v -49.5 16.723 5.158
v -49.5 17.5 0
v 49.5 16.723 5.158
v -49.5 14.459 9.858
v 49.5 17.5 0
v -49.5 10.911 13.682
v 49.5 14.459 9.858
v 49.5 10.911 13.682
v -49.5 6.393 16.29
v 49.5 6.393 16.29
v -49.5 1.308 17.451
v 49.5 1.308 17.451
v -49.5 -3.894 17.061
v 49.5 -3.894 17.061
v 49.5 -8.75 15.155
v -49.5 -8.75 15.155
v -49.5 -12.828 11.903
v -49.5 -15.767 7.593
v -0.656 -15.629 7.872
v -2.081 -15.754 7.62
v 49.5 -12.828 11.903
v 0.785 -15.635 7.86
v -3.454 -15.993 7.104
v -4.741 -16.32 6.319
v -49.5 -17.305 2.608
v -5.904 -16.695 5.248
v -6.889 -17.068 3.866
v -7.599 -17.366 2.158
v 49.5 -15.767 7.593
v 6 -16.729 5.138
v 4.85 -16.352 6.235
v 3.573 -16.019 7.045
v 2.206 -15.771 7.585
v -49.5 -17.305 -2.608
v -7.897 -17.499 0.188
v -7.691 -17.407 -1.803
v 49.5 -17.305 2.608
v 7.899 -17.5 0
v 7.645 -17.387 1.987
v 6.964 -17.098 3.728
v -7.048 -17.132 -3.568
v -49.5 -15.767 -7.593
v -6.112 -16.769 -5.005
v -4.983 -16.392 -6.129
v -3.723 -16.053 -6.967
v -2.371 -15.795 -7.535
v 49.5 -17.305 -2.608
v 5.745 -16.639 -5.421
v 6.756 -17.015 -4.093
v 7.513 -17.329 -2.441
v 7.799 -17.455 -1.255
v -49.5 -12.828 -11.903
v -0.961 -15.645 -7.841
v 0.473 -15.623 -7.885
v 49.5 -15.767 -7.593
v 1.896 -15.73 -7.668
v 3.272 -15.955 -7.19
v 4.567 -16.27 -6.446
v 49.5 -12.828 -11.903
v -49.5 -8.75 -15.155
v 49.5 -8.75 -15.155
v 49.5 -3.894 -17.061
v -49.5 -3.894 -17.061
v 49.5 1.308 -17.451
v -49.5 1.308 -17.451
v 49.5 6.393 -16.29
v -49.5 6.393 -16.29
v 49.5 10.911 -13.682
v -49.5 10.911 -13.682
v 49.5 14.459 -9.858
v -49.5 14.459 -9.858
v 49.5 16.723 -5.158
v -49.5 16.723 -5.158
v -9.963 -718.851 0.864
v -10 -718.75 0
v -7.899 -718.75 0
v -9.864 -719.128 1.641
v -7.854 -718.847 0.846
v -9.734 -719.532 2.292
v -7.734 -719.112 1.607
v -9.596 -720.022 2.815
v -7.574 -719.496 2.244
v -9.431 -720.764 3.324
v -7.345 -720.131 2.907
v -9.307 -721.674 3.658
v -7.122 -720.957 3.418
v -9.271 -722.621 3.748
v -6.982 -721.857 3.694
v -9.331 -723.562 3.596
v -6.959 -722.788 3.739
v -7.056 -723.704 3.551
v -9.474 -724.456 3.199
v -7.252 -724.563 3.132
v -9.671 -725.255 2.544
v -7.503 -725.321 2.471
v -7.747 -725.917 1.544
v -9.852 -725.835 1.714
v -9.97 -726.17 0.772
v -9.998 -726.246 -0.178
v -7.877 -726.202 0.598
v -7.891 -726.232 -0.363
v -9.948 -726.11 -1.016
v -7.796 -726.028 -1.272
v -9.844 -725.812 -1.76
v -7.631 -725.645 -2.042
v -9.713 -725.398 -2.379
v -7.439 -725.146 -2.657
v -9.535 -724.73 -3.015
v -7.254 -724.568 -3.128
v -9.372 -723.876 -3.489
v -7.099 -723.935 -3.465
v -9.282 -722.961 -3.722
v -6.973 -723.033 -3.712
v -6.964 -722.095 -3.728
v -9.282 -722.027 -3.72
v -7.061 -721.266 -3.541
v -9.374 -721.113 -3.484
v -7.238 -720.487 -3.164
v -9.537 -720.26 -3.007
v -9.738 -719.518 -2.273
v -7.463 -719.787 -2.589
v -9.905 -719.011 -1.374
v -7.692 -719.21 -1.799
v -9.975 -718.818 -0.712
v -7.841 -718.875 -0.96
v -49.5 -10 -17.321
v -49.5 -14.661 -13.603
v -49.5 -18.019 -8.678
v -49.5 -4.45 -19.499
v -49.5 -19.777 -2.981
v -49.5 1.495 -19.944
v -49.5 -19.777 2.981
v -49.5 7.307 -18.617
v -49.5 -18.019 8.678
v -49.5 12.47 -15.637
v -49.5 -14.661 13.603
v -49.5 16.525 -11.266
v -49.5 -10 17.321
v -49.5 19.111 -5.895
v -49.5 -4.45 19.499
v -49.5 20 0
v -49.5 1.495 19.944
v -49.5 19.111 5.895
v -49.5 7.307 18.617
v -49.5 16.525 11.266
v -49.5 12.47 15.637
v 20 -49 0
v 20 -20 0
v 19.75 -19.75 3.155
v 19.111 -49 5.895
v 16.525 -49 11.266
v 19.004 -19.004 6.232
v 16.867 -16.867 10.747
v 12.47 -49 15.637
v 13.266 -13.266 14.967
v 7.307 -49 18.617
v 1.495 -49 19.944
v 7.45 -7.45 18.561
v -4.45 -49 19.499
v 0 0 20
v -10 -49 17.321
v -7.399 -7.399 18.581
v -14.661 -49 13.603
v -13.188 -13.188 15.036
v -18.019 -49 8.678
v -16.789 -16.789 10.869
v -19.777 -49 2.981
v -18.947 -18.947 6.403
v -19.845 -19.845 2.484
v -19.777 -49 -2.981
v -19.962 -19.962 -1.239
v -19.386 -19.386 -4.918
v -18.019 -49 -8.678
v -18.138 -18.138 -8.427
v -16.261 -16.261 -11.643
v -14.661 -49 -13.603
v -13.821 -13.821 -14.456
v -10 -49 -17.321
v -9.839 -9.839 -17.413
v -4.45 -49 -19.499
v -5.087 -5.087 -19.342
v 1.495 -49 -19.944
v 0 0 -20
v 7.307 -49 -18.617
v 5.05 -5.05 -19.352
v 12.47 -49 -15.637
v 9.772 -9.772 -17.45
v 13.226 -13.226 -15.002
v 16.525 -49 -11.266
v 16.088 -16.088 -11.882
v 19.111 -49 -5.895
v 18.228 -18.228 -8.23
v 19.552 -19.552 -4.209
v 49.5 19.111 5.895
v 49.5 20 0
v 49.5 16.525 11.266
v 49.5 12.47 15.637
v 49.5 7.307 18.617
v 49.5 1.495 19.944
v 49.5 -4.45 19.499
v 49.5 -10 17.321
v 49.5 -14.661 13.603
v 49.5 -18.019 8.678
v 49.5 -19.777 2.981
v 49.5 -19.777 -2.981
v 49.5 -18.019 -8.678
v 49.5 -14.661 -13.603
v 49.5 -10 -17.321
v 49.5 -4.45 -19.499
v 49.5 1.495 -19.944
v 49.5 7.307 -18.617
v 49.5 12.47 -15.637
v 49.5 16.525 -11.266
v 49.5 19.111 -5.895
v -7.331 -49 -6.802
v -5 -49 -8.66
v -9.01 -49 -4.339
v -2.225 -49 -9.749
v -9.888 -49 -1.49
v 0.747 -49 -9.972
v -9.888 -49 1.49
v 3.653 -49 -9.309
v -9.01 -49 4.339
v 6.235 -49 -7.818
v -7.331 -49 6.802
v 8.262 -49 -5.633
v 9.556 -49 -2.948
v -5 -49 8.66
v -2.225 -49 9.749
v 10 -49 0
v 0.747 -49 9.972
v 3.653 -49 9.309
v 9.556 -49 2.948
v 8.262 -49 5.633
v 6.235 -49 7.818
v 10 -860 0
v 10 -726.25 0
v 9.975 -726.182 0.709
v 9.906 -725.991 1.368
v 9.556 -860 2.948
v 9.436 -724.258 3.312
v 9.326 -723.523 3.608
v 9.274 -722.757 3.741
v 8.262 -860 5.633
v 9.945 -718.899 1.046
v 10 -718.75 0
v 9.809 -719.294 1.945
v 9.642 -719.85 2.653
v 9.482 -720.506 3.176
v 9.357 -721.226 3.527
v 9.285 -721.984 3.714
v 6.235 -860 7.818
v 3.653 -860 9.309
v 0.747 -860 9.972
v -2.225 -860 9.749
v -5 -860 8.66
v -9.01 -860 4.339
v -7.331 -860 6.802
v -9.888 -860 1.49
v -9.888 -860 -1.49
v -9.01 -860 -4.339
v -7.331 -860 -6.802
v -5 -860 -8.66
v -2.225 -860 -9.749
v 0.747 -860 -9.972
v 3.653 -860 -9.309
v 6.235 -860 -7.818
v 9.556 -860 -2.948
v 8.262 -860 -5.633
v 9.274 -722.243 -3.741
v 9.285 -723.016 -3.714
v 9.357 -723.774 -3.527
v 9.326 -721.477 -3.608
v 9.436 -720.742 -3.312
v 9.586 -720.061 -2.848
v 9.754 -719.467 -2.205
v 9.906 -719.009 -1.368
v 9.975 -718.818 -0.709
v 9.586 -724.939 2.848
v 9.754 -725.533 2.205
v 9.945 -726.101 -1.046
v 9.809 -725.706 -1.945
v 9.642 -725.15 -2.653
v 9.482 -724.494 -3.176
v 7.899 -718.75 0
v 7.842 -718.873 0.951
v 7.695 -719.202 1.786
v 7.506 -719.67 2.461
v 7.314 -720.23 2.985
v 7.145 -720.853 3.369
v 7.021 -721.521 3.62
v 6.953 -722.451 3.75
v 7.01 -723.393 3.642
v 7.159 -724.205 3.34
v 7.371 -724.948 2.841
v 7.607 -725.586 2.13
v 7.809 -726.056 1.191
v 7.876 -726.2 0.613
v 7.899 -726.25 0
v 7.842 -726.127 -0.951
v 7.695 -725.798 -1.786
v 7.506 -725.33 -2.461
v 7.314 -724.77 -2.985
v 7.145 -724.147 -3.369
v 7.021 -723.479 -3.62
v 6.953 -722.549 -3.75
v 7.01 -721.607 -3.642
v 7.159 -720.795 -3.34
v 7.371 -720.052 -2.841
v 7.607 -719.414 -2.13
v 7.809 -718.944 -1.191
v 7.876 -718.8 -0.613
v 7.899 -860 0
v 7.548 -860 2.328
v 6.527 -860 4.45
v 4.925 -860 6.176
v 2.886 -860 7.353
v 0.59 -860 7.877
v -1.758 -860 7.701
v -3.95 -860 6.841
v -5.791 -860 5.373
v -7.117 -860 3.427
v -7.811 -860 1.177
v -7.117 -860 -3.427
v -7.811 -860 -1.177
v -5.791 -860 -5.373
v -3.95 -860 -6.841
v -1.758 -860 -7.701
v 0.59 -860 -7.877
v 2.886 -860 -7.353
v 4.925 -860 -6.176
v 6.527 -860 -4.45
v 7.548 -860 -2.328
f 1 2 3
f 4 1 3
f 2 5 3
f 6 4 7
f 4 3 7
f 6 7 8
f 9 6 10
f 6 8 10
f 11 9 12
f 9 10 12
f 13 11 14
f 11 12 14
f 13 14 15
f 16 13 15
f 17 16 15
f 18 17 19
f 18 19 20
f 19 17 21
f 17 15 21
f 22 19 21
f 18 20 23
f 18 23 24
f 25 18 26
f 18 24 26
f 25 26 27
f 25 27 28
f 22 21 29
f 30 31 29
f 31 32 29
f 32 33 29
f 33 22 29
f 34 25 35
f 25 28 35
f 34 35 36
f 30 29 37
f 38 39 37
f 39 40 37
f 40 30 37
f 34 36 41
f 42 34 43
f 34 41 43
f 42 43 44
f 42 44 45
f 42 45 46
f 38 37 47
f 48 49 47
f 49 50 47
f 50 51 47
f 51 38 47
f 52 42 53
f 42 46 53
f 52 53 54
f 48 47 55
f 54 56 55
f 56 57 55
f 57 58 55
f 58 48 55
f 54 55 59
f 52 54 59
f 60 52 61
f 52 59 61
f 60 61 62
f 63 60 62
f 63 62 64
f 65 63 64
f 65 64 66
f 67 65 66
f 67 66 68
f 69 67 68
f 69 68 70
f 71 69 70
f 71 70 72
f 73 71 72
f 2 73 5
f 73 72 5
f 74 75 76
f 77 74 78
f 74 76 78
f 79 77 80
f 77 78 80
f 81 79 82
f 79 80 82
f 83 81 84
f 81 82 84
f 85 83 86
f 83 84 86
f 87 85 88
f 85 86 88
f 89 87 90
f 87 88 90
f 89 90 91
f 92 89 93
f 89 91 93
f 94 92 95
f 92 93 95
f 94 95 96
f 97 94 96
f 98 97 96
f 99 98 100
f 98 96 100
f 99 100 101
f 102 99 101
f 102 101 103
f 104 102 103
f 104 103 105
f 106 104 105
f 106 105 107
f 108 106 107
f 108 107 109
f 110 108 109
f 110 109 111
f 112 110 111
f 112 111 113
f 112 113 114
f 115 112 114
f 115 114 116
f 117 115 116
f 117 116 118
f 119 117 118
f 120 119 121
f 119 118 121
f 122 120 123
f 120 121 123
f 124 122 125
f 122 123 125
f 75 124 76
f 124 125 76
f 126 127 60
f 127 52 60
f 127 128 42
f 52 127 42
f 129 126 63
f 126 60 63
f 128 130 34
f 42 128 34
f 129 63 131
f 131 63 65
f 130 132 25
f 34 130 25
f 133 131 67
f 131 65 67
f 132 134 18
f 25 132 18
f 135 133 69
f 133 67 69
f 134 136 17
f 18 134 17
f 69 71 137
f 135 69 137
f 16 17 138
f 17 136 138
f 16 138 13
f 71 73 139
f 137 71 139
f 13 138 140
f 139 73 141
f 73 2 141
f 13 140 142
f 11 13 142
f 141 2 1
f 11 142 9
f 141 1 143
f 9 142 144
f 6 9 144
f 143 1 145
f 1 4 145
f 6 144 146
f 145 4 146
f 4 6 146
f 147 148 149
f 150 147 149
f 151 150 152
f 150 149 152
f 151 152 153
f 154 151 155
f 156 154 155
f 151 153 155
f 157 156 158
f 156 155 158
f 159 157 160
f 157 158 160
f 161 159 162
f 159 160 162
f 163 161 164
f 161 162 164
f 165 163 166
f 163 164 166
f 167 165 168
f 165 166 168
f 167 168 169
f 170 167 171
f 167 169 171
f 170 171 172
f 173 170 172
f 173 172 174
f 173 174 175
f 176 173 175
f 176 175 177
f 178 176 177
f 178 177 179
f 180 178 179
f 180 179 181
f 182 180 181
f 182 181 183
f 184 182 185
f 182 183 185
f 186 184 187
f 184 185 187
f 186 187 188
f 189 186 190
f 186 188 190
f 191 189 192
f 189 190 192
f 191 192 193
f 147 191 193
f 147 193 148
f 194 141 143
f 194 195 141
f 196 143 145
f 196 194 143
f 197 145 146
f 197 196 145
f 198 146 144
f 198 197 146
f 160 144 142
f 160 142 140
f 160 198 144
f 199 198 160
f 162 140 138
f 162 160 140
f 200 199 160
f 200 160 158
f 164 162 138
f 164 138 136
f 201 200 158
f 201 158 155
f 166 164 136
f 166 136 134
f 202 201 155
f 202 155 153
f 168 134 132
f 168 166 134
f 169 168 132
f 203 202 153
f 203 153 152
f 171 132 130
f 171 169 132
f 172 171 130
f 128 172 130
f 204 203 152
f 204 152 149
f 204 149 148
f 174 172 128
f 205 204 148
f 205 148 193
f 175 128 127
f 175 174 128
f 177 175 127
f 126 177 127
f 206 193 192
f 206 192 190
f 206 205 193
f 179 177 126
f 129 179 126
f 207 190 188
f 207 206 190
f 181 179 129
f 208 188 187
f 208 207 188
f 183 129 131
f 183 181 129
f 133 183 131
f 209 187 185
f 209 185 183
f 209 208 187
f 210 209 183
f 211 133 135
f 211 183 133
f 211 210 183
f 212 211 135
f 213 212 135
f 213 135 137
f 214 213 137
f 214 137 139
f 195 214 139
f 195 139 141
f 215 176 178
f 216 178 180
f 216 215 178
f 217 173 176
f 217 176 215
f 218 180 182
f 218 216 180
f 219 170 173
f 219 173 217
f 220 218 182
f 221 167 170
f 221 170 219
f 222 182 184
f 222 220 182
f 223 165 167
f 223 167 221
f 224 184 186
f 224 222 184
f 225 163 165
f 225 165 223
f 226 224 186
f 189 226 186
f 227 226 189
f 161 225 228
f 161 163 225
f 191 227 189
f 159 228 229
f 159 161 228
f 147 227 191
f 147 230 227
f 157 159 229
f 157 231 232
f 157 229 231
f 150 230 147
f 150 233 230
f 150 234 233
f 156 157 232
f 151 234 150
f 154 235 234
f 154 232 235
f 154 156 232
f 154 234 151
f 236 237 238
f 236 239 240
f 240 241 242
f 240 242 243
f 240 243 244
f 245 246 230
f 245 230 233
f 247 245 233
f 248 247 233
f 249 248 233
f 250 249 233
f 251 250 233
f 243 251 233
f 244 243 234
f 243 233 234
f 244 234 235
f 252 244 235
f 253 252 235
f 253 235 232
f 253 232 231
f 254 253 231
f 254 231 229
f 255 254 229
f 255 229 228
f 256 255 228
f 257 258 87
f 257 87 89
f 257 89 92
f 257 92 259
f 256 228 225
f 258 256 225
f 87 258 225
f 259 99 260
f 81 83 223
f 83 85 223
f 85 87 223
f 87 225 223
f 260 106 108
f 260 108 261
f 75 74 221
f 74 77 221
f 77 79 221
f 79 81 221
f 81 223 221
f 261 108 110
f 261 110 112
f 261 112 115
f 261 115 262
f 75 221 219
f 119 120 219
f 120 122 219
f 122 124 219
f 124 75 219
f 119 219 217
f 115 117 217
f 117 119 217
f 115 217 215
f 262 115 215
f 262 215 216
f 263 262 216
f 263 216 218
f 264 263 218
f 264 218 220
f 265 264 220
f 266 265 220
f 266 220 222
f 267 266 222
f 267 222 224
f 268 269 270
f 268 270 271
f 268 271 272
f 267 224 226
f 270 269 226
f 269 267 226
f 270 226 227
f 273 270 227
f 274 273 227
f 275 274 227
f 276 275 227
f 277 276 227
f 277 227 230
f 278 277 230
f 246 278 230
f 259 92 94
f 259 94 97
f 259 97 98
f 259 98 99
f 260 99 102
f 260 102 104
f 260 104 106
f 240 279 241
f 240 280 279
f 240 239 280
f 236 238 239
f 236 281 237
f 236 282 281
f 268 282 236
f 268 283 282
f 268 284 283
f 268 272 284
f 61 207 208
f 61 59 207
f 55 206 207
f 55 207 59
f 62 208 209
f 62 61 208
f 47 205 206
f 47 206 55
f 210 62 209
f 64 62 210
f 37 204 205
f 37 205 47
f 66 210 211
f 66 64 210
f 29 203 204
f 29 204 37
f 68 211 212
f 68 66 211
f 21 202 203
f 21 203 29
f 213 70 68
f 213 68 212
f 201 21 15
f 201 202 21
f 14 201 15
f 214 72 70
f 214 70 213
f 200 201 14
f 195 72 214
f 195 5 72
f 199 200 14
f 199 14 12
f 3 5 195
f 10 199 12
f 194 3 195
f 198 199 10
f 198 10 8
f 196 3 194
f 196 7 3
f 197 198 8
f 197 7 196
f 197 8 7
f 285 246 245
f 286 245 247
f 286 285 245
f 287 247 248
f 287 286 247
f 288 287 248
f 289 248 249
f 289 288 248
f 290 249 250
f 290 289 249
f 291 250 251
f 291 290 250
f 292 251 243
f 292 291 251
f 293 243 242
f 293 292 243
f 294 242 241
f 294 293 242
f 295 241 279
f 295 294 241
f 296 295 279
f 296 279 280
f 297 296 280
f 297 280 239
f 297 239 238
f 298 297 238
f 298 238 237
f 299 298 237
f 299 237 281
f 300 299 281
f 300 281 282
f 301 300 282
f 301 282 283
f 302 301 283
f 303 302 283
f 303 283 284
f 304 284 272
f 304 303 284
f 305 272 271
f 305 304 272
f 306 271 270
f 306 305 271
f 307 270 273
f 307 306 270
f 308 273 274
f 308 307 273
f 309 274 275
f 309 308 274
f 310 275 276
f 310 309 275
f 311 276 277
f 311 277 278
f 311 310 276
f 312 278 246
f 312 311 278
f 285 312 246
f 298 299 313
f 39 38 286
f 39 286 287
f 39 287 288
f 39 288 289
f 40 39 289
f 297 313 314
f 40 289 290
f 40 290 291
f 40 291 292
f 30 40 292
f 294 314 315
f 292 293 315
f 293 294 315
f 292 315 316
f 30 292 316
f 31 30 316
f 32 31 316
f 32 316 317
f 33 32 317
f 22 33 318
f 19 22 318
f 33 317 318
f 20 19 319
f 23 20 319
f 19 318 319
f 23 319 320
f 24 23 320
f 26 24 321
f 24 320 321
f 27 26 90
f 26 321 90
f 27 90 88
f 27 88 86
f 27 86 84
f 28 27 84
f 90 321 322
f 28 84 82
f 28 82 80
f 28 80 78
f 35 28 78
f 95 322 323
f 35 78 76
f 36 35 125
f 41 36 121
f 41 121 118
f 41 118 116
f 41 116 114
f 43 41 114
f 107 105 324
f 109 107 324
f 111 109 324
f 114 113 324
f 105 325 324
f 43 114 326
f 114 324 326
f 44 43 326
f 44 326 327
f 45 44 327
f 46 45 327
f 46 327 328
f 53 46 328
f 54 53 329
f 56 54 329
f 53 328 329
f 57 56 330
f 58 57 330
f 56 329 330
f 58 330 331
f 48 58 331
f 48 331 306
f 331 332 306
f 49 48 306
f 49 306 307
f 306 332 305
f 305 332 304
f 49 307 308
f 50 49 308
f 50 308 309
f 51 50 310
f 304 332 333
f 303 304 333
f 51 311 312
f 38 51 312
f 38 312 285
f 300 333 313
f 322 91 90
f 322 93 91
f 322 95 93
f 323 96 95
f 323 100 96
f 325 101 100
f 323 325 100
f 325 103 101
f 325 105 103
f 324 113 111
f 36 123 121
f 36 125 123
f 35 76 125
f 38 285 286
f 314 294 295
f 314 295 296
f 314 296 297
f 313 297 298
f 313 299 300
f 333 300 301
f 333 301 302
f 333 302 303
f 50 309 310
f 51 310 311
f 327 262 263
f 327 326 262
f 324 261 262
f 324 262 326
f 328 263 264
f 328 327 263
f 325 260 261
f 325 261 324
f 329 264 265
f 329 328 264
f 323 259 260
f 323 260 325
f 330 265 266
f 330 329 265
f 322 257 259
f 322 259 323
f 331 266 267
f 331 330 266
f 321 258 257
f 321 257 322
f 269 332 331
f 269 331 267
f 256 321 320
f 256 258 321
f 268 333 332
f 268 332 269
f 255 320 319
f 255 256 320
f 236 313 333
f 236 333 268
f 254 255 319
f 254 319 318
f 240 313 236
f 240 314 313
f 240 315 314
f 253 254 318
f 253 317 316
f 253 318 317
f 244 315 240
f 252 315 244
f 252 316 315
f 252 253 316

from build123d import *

# Parameters (mm, degrees)
F0_R          = 10
F1_DEPTH      = 860
F2_R          = 20
F3_DEPTH      = 49.5
F4_R          = 3.75
F5_DEPTH      = 96
F5_DEPTH_BACK = 63
F6_R          = 17.5
F7_DEPTH      = 216
F8_R          = 7.8994
F9_DEPTH      = 850
F10_R         = 20
F10_R_2       = 10
F11_DEPTH     = 49
F12_R         = 17.5
F13_DEPTH     = 133


with BuildPart() as f1:
    # F0 (on Front) → F1 (new body)
    with BuildSketch(Plane.XZ):
        Circle(F0_R)
    extrude(amount=F1_DEPTH)

    # F2 (on Right) → F3 (join, symmetric)
    with BuildSketch(Plane.YZ):
        Circle(F2_R)
    extrude(amount=F3_DEPTH, both=True)

    # F4 (on Right) → F5 (cut, two sides)
    with BuildSketch(Plane.YZ) as f5_sk:
        with Locations((-722.5, 0)):
            Circle(F4_R)
    extrude(amount=F5_DEPTH, mode=Mode.SUBTRACT)
    extrude(f5_sk.sketch, amount=-F5_DEPTH_BACK, mode=Mode.SUBTRACT)

    # F6 (on face) → F7 (cut, symmetric)
    with BuildSketch(Plane.YZ.offset(49.5)):
        Circle(F6_R)
    extrude(amount=F7_DEPTH, both=True, mode=Mode.SUBTRACT)

    # F8 (on face) → F9 (cut)
    with BuildSketch(Plane.XZ.offset(860)):
        Circle(F8_R)
    extrude(amount=-F9_DEPTH, mode=Mode.SUBTRACT)

    # F10 (on Front) → F11 (join)
    with BuildSketch(Plane.XZ):
        Circle(F10_R)
        Circle(F10_R_2, mode=Mode.SUBTRACT)
    extrude(amount=F11_DEPTH)

    # F12 (on face) → F13 (cut)
    with BuildSketch(Plane.YZ.offset(49.5)):
        Circle(F12_R)
    extrude(amount=-F13_DEPTH, mode=Mode.SUBTRACT)


solid = f1.part
